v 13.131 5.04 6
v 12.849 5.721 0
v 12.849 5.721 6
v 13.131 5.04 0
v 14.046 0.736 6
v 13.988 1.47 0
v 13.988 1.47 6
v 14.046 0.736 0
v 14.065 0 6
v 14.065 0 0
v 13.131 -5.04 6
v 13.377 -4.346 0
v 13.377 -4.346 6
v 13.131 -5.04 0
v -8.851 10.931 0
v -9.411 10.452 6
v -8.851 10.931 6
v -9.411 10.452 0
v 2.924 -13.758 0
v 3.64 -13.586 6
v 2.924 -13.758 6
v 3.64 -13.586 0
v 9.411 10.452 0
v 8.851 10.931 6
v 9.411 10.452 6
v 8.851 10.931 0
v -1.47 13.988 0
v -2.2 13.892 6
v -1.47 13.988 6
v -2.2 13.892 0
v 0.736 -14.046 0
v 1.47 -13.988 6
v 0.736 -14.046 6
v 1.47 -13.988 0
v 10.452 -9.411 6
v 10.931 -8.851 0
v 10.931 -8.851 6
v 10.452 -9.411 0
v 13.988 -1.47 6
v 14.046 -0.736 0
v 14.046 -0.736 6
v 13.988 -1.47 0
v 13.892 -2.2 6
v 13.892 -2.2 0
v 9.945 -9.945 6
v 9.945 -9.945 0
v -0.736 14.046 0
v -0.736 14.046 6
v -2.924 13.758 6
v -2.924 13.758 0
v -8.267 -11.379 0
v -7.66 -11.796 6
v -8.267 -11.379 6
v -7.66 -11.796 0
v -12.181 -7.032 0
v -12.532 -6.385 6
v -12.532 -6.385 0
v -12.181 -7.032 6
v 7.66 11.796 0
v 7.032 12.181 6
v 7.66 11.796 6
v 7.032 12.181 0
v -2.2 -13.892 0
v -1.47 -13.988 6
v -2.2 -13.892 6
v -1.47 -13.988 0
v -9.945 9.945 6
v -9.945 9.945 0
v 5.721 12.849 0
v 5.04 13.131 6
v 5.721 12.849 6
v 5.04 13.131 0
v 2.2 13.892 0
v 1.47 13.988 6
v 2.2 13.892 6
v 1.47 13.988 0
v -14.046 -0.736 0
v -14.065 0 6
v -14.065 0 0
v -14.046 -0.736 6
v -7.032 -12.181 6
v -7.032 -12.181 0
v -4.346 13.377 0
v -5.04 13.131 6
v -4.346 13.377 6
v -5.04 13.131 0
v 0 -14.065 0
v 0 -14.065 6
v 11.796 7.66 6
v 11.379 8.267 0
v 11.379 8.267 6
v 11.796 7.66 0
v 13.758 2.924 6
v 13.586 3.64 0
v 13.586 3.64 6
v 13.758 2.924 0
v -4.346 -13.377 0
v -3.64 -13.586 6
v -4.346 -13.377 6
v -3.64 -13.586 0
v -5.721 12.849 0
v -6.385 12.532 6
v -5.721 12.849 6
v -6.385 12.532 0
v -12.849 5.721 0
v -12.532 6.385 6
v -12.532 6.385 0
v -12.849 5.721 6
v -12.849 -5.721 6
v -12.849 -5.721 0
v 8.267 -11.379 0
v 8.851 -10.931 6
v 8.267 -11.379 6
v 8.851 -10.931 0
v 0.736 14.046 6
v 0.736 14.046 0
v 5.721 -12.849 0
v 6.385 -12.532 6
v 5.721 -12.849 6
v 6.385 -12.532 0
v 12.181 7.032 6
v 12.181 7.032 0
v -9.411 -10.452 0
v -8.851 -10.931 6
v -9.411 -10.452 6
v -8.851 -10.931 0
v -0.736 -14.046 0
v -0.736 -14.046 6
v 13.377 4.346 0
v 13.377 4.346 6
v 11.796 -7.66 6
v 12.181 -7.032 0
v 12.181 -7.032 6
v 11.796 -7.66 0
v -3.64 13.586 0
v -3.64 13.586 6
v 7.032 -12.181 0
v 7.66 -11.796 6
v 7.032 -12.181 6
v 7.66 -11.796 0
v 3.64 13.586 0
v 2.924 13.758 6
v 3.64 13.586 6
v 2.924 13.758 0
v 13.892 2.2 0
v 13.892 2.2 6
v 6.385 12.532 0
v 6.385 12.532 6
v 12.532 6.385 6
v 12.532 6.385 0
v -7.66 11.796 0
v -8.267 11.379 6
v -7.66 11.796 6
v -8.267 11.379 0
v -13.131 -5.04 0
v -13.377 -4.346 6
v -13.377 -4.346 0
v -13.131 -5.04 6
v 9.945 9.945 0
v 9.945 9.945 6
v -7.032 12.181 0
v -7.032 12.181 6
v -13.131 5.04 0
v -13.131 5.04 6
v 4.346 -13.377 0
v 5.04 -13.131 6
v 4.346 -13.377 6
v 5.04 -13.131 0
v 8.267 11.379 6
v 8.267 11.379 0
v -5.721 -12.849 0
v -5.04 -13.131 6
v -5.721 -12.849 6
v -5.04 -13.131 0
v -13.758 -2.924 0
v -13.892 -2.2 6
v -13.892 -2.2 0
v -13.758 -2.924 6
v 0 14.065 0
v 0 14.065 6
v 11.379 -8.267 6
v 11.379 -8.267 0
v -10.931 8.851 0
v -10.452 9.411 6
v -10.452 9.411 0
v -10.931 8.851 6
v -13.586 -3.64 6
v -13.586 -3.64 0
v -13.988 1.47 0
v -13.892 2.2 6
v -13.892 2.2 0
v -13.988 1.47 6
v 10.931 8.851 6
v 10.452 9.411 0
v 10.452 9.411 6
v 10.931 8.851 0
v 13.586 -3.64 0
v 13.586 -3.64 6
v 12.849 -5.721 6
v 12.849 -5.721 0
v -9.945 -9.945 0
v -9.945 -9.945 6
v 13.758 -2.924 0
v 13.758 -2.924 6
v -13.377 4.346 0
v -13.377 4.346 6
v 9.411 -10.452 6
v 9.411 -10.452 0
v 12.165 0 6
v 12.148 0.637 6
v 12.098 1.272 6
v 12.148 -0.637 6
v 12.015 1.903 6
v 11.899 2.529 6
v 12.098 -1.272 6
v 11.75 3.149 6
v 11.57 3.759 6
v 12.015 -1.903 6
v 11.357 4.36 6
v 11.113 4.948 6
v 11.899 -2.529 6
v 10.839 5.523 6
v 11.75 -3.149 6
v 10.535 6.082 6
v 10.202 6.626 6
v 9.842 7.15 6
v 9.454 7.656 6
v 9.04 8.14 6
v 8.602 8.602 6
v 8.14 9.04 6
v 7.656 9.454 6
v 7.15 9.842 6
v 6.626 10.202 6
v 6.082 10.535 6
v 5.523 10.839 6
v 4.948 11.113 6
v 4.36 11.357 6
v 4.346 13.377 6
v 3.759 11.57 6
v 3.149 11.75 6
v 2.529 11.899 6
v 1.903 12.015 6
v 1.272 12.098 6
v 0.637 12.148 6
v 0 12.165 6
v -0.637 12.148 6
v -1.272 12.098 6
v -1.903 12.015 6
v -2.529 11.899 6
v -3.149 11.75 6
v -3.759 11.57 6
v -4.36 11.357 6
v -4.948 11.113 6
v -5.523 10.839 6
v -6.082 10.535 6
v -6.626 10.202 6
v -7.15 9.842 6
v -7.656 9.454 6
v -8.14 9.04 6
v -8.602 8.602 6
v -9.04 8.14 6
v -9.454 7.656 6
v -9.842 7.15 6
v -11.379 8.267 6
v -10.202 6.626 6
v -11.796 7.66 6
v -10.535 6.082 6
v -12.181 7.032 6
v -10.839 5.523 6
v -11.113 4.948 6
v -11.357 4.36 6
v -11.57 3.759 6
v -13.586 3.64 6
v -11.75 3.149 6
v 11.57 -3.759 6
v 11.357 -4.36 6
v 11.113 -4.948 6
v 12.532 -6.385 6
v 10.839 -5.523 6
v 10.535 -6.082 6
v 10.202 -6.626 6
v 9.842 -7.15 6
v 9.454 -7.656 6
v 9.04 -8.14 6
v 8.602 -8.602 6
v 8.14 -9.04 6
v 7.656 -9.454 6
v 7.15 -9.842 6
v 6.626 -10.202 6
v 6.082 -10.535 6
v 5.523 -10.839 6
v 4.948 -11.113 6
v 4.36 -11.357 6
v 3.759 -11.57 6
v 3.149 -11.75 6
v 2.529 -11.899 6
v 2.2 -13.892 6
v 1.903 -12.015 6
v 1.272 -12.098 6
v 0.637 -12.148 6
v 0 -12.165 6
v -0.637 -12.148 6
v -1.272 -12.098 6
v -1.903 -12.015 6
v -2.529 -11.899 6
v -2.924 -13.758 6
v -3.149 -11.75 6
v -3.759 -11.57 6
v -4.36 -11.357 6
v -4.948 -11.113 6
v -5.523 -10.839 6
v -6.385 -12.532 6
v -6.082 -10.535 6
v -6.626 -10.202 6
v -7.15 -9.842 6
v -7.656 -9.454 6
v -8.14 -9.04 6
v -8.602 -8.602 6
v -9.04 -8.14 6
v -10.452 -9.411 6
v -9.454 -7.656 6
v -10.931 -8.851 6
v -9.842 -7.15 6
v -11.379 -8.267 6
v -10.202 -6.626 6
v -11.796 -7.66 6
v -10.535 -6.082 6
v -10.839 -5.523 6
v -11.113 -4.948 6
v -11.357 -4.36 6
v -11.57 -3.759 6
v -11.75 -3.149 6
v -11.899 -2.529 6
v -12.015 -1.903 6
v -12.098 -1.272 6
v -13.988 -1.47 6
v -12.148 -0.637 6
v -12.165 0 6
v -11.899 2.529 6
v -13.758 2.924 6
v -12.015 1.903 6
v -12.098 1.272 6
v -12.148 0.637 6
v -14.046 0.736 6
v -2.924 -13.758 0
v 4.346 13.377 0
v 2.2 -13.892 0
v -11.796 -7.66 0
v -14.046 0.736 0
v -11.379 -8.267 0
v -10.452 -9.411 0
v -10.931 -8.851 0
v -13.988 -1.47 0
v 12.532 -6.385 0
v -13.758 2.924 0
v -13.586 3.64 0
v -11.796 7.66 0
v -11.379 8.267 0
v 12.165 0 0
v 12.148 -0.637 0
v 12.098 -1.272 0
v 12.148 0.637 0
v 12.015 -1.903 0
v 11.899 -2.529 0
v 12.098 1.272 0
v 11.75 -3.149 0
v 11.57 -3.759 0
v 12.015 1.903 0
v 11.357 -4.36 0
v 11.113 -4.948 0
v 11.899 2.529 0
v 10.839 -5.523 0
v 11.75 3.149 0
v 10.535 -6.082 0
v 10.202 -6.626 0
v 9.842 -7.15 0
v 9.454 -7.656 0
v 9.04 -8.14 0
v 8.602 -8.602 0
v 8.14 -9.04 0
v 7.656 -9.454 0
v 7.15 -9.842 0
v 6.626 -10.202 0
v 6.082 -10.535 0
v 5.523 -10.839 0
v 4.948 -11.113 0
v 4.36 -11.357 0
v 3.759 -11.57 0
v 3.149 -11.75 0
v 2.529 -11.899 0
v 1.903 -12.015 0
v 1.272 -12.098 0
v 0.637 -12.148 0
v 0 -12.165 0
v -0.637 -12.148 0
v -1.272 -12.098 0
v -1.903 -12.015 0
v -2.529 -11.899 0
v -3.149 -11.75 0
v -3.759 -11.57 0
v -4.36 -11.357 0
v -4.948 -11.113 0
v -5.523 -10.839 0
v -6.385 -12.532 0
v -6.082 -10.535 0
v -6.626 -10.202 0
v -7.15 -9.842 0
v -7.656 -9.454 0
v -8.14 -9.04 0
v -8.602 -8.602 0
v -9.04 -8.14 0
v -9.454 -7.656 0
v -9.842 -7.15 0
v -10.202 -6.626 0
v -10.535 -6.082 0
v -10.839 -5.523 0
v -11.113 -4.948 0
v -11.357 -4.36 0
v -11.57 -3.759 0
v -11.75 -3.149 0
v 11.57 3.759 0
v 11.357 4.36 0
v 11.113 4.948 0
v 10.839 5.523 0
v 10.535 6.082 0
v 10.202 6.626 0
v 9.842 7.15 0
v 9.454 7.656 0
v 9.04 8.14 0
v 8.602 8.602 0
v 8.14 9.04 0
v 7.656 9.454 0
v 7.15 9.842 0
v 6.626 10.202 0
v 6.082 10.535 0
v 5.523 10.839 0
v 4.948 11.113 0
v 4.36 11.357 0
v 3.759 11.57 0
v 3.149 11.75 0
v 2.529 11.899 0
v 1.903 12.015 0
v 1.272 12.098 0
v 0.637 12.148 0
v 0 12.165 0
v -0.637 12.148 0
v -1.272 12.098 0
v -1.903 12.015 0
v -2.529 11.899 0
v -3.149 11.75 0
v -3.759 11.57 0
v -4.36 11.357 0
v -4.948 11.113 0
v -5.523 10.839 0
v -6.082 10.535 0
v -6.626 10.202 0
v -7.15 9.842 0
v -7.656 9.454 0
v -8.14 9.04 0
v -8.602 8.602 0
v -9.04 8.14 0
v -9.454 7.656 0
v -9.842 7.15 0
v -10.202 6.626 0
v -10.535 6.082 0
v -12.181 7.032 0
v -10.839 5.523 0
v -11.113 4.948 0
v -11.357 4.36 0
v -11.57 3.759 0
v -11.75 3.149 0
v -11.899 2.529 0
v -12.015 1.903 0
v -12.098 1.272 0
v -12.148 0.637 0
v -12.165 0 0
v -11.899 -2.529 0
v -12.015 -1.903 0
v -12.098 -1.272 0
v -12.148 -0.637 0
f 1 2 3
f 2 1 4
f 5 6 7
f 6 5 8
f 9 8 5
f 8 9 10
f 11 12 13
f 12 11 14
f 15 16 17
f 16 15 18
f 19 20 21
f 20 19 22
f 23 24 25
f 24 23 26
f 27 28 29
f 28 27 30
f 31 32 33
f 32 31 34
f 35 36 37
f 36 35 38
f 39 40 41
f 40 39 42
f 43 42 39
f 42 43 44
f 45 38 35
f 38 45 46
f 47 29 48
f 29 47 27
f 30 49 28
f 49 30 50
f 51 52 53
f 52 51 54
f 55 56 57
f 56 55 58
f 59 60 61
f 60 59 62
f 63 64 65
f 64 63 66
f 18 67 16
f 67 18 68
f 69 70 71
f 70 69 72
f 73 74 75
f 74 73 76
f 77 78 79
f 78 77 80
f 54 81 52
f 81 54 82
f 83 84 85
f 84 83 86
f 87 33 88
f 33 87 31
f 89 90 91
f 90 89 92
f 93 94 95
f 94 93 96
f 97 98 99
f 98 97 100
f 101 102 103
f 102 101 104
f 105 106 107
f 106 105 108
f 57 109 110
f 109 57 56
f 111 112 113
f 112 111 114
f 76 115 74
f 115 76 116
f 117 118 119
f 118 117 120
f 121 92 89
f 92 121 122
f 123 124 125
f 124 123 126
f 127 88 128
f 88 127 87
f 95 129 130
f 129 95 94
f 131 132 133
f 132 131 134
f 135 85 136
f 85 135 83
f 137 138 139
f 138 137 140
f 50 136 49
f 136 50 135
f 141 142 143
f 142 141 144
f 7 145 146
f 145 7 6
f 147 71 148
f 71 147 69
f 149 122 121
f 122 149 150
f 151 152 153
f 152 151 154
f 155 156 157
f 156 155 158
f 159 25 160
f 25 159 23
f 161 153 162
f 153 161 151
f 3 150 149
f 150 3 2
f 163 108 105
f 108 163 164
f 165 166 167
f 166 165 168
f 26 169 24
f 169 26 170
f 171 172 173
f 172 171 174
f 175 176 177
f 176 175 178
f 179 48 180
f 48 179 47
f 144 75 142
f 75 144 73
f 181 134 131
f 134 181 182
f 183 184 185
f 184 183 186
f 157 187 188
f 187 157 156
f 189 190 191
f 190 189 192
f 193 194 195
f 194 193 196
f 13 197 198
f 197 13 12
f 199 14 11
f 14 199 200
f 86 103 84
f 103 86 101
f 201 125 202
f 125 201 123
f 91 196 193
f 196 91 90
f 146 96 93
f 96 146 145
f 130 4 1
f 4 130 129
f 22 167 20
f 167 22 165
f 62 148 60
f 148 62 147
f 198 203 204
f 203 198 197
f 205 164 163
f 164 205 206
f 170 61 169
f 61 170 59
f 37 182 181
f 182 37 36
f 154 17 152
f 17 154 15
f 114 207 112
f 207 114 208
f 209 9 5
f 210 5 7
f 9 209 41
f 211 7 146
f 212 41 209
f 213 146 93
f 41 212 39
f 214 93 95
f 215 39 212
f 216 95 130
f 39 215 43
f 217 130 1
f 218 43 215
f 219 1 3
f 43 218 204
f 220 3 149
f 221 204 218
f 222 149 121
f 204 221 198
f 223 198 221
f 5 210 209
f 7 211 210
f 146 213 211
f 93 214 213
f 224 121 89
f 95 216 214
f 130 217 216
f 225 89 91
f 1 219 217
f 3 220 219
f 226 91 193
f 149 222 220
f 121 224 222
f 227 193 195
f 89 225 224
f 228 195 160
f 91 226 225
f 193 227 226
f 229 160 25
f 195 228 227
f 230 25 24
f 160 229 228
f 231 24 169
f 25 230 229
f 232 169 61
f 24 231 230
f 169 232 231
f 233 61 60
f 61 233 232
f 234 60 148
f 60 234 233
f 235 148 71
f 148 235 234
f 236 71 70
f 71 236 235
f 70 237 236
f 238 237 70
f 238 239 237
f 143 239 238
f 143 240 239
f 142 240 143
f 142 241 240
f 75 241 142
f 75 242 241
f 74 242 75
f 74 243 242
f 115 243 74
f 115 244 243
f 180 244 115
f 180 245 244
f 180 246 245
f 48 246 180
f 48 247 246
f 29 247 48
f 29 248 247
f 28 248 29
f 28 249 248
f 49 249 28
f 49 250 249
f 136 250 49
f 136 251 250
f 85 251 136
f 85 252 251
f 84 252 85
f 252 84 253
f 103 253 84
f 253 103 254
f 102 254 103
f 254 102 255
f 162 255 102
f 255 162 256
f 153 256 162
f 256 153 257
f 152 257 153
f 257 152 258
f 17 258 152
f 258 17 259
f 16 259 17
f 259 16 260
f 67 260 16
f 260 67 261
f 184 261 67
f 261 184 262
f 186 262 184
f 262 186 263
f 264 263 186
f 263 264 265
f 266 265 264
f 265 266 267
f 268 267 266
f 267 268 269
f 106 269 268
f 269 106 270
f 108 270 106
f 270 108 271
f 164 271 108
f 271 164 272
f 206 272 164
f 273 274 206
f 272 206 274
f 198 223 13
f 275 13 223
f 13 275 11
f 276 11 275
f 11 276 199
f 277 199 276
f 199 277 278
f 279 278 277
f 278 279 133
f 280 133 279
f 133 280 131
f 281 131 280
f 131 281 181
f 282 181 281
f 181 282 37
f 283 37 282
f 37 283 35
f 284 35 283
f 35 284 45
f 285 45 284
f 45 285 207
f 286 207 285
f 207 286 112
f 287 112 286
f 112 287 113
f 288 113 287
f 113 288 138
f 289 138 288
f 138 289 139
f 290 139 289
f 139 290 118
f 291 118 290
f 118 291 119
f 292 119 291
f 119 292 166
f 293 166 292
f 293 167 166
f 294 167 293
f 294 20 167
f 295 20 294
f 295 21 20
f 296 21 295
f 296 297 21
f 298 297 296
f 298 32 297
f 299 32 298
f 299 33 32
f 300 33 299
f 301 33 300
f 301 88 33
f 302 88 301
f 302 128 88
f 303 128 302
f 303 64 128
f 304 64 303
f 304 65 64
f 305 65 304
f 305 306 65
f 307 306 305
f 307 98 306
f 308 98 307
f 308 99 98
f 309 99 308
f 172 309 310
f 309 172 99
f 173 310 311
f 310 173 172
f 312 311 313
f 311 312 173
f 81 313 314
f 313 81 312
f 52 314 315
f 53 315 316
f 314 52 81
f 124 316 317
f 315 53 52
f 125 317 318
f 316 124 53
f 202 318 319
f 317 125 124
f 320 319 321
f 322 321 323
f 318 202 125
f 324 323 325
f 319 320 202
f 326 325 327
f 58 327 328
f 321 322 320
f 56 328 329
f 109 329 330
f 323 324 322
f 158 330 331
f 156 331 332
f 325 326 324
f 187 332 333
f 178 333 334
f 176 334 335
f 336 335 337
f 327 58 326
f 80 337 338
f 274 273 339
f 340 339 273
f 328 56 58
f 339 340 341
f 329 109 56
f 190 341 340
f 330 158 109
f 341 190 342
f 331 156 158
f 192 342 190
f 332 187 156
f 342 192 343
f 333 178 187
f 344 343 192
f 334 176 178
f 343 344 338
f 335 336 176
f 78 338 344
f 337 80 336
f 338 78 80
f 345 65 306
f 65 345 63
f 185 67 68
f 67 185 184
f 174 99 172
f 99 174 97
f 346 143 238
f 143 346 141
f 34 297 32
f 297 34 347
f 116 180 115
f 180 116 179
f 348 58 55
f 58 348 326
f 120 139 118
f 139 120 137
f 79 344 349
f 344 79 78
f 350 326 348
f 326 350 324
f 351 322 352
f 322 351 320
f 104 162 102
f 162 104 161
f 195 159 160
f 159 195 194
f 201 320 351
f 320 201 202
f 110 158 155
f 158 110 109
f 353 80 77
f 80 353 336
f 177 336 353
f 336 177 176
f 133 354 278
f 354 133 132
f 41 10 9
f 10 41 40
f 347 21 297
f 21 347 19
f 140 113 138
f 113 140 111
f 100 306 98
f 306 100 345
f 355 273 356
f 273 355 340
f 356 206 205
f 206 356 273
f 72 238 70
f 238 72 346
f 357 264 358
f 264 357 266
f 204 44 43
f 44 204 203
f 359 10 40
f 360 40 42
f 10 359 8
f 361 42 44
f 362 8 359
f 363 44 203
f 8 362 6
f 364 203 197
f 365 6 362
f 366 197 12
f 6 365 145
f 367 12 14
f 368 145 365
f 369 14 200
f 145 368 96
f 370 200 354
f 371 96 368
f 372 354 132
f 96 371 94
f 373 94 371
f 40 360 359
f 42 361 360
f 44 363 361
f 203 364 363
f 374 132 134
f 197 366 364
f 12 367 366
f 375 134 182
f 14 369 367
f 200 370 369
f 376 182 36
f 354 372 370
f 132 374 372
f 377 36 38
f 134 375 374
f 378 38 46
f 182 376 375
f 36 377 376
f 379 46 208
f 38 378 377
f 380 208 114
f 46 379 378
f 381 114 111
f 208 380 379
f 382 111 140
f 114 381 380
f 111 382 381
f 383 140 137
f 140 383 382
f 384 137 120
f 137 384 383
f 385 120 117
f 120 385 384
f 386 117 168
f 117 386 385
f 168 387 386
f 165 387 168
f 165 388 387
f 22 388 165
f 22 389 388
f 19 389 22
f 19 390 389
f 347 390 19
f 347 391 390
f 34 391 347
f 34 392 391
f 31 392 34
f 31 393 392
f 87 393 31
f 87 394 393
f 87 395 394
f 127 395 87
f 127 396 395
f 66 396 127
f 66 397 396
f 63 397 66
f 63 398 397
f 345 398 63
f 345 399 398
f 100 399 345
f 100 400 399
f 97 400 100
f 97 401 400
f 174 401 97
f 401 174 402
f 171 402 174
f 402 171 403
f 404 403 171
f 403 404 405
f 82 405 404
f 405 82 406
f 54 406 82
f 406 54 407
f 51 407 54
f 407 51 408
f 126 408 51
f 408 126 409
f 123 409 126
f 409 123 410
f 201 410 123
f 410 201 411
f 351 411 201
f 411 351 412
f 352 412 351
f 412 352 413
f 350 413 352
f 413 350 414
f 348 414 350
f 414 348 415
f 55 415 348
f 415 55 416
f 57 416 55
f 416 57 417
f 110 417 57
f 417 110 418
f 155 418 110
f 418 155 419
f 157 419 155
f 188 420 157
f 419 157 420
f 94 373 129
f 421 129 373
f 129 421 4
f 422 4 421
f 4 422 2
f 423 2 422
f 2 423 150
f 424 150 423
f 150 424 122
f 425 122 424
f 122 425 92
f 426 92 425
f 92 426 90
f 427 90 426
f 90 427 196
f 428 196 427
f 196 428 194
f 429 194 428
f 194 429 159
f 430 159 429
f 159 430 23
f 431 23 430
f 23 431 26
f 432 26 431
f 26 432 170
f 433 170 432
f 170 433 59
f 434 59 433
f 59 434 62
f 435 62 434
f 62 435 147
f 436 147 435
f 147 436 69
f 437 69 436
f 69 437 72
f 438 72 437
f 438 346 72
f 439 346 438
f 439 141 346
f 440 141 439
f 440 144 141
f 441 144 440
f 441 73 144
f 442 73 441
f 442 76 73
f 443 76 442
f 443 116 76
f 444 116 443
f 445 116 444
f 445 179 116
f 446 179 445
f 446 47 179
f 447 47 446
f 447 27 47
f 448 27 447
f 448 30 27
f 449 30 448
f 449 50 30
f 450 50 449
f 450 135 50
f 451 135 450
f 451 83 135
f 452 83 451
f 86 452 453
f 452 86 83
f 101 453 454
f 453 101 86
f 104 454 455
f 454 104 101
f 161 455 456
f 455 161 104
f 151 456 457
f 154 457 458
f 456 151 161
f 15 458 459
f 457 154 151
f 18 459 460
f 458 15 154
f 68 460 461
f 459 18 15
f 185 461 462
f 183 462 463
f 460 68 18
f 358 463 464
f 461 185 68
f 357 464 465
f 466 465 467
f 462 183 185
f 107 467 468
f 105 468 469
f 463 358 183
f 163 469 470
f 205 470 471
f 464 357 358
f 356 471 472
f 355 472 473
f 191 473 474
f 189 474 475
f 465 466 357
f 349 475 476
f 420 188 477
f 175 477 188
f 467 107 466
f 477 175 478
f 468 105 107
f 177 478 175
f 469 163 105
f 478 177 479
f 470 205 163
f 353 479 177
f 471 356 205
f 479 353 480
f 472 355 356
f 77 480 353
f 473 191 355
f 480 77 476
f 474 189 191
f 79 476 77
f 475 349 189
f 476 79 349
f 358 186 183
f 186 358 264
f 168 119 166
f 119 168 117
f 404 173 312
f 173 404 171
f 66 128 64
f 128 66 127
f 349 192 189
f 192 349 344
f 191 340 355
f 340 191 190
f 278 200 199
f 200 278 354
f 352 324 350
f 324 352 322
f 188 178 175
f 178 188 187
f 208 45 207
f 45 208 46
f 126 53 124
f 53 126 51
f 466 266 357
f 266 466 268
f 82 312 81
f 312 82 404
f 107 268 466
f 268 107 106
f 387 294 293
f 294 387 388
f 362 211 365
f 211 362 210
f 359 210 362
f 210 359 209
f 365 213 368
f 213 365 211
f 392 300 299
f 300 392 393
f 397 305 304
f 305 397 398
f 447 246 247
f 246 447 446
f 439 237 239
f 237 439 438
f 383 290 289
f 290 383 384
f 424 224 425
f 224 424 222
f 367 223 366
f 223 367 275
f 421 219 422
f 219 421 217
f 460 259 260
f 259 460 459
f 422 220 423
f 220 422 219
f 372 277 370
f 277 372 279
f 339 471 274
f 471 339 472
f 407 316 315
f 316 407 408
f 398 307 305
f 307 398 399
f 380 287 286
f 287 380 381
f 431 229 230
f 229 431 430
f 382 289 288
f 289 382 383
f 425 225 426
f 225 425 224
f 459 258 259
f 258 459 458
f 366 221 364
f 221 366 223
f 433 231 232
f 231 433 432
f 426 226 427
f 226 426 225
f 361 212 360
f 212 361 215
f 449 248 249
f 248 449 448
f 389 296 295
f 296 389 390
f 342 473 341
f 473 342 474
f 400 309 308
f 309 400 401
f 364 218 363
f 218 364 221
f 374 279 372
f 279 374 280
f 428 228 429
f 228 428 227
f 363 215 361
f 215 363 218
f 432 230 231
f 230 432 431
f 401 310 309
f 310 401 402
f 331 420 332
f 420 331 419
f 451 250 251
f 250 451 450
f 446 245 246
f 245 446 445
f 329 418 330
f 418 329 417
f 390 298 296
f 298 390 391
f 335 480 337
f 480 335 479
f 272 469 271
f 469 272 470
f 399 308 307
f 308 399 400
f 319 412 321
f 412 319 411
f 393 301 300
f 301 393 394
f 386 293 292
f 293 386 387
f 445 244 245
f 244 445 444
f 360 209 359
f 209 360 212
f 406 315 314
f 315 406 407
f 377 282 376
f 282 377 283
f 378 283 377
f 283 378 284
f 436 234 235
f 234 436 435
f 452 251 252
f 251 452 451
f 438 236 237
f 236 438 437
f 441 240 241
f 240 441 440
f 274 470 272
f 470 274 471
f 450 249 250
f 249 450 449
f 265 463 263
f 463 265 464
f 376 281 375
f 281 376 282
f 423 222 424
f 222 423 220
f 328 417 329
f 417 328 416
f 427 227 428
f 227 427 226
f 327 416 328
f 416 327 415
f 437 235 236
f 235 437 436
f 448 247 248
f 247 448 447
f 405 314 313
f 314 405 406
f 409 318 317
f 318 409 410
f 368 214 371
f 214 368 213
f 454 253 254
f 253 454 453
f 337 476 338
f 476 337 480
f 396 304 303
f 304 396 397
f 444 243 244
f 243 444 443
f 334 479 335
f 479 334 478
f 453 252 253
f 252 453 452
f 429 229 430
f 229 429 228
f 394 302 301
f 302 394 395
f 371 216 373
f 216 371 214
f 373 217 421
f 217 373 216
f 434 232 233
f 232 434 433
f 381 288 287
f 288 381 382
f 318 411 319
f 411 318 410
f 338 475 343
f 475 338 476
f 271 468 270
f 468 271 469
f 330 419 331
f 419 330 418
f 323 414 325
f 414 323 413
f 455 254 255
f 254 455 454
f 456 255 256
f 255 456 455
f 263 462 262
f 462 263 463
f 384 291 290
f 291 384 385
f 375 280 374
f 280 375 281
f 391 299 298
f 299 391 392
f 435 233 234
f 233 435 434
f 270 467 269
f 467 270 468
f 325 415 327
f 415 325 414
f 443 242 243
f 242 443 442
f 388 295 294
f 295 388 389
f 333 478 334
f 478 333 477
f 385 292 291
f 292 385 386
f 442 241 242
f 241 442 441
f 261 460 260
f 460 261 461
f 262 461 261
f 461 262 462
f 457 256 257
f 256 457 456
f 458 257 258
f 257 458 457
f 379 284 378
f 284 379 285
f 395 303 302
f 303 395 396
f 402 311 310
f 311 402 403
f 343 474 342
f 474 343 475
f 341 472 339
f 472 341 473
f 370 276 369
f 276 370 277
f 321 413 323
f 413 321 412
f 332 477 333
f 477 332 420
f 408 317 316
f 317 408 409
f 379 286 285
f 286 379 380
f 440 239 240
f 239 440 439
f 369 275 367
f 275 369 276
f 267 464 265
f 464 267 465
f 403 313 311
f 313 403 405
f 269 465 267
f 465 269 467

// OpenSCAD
// file: Bird_Config.scad
/////////////////////////////////////////////////////////
// 7" Spinning Trolling Bird
// Global Parameters
// Units = mm
/////////////////////////////////////////////////////////

$fn = 120;

//----------------------------
// Overall Dimensions
//----------------------------

overall_length = 177.8;
body_length    = 114.3;
nose_length    = 63.5;

max_diameter   = 50.8;
front_diameter = 43.688; // 1.72"
tail_diameter  = 7.112;  // 0.28"
nose_tip       = 8.0;
nose_cone_length = 17.78;       // 0.70"
nose_cone_base_diameter = 24.13; // 0.95"

//----------------------------
// Wall Thickness
//----------------------------

wall = 2.8;

//----------------------------
// Shaft
//----------------------------

shaft_diameter = 4.0;
bearing_diameter = 6.0;

shaft_length = 150;

shaft_clearance = 0.20;

//----------------------------
// Hardware
//----------------------------

screw = 3.0;

insert_OD = 5.0;
insert_length = 4.0;

insert_depth = 5.2;

num_screws = 6;

//----------------------------
// Tow Eye
//----------------------------

eye_OD = 10;
eye_ID = 5;
eye_length = 8;

//----------------------------
// Ballast Cavity
//----------------------------

ballast_diameter = 18;
ballast_length = 60;

//----------------------------
// Rotor
//----------------------------

blade_count = 2;

blade_span = 62;

blade_width = 18;

blade_thickness = 3.2;

blade_pitch = 28;

//----------------------------
// Nose Bearing
//----------------------------

bearing_OD = 12;

bearing_ID = 6.1;

bearing_depth = 10;

//----------------------------
// Alignment Pins
//----------------------------

pin_diameter = 3.0;

pin_length = 8;

//----------------------------
// Split Plane
//----------------------------

split = 0;

//----------------------------
// Clearances
//----------------------------

fit = 0.20;

//----------------------------
// Retaining Collar
//----------------------------

collar_length = 6.0;
collar_wall = 2.0;
// file: Bird_Nose.scad
include <Bird_Config.scad>;

/////////////////////////////////////////////////////////
// LEFT SPINNING NOSE
/////////////////////////////////////////////////////////

module nose_profile(){

    hull(){

        // Tip
        translate([0,0,0])
            sphere(d = nose_tip);

        // Front cone base
        translate([nose_cone_length,0,0])
            sphere(d = nose_cone_base_diameter);

        // Rear
        translate([nose_length,0,0])
            sphere(d = max_diameter);

    }

}

module retaining_collar(){

    difference(){

        cylinder(
            d=nose_cone_base_diameter + (collar_wall*2),
            h=collar_length,
            center=false);

        translate([0,0,-1])
            cylinder(
                d=nose_cone_base_diameter + fit,
                h=collar_length+2,
                center=false);

    }

}

/////////////////////////////////////////////////////////
// Hollow Shell
/////////////////////////////////////////////////////////

module nose_shell(){

    difference(){

        nose_profile();

        translate([0,0,0])

        scale([
            (max_diameter-wall*2)/max_diameter,
            (max_diameter-wall*2)/max_diameter,
            (max_diameter-wall*2)/max_diameter
        ])

        nose_profile();

    }

}

/////////////////////////////////////////////////////////
// Bearing Pocket
/////////////////////////////////////////////////////////

module bearing_pocket(){

    translate([nose_length-12,0,0])

    rotate([0,90,0])

    cylinder(
        d=bearing_OD,
        h=12,
        center=false);

}

/////////////////////////////////////////////////////////
// Shaft Bore
/////////////////////////////////////////////////////////

module shaft_bore(){

    translate([-2,0,0])

    rotate([0,90,0])

    cylinder(
        d=shaft_diameter+fit,
        h=nose_length+6);

}

/////////////////////////////////////////////////////////
// Rotor Blade
/////////////////////////////////////////////////////////

module blade(){

    translate([28,0,0])

    rotate([0,-18,25])

    linear_extrude(height=blade_thickness)

    polygon([
        [0,0],
        [blade_span,-6],
        [blade_span,-18],
        [22,-30],
        [0,-18]
    ]);

}

/////////////////////////////////////////////////////////
// Nose Half Modules
/////////////////////////////////////////////////////////

module nose_left(){

    intersection(){

        union(){

            nose_shell();

            blade();

        }

        translate([-20,-100,-100])

            cube([120,100,200]);

    }

}

module nose_right(){

    mirror([0,1,0])
        nose_left();

}

/////////////////////////////////////////////////////////
// EXPORT NOSES
/////////////////////////////////////////////////////////

// Uncomment one at a time to export:

// Nose Left Half
// difference(){
//     nose_left();
//     bearing_pocket();
//     shaft_bore();
// }

// Nose Right Half
// difference(){
//     nose_right();
//     bearing_pocket();
//     shaft_bore();
// }
// main file
include <Bird_Nose.scad>;

//////////////////////////////////////////////////////
// Export: Retaining Collar (for 3D printing)
//////////////////////////////////////////////////////

retaining_collar();
